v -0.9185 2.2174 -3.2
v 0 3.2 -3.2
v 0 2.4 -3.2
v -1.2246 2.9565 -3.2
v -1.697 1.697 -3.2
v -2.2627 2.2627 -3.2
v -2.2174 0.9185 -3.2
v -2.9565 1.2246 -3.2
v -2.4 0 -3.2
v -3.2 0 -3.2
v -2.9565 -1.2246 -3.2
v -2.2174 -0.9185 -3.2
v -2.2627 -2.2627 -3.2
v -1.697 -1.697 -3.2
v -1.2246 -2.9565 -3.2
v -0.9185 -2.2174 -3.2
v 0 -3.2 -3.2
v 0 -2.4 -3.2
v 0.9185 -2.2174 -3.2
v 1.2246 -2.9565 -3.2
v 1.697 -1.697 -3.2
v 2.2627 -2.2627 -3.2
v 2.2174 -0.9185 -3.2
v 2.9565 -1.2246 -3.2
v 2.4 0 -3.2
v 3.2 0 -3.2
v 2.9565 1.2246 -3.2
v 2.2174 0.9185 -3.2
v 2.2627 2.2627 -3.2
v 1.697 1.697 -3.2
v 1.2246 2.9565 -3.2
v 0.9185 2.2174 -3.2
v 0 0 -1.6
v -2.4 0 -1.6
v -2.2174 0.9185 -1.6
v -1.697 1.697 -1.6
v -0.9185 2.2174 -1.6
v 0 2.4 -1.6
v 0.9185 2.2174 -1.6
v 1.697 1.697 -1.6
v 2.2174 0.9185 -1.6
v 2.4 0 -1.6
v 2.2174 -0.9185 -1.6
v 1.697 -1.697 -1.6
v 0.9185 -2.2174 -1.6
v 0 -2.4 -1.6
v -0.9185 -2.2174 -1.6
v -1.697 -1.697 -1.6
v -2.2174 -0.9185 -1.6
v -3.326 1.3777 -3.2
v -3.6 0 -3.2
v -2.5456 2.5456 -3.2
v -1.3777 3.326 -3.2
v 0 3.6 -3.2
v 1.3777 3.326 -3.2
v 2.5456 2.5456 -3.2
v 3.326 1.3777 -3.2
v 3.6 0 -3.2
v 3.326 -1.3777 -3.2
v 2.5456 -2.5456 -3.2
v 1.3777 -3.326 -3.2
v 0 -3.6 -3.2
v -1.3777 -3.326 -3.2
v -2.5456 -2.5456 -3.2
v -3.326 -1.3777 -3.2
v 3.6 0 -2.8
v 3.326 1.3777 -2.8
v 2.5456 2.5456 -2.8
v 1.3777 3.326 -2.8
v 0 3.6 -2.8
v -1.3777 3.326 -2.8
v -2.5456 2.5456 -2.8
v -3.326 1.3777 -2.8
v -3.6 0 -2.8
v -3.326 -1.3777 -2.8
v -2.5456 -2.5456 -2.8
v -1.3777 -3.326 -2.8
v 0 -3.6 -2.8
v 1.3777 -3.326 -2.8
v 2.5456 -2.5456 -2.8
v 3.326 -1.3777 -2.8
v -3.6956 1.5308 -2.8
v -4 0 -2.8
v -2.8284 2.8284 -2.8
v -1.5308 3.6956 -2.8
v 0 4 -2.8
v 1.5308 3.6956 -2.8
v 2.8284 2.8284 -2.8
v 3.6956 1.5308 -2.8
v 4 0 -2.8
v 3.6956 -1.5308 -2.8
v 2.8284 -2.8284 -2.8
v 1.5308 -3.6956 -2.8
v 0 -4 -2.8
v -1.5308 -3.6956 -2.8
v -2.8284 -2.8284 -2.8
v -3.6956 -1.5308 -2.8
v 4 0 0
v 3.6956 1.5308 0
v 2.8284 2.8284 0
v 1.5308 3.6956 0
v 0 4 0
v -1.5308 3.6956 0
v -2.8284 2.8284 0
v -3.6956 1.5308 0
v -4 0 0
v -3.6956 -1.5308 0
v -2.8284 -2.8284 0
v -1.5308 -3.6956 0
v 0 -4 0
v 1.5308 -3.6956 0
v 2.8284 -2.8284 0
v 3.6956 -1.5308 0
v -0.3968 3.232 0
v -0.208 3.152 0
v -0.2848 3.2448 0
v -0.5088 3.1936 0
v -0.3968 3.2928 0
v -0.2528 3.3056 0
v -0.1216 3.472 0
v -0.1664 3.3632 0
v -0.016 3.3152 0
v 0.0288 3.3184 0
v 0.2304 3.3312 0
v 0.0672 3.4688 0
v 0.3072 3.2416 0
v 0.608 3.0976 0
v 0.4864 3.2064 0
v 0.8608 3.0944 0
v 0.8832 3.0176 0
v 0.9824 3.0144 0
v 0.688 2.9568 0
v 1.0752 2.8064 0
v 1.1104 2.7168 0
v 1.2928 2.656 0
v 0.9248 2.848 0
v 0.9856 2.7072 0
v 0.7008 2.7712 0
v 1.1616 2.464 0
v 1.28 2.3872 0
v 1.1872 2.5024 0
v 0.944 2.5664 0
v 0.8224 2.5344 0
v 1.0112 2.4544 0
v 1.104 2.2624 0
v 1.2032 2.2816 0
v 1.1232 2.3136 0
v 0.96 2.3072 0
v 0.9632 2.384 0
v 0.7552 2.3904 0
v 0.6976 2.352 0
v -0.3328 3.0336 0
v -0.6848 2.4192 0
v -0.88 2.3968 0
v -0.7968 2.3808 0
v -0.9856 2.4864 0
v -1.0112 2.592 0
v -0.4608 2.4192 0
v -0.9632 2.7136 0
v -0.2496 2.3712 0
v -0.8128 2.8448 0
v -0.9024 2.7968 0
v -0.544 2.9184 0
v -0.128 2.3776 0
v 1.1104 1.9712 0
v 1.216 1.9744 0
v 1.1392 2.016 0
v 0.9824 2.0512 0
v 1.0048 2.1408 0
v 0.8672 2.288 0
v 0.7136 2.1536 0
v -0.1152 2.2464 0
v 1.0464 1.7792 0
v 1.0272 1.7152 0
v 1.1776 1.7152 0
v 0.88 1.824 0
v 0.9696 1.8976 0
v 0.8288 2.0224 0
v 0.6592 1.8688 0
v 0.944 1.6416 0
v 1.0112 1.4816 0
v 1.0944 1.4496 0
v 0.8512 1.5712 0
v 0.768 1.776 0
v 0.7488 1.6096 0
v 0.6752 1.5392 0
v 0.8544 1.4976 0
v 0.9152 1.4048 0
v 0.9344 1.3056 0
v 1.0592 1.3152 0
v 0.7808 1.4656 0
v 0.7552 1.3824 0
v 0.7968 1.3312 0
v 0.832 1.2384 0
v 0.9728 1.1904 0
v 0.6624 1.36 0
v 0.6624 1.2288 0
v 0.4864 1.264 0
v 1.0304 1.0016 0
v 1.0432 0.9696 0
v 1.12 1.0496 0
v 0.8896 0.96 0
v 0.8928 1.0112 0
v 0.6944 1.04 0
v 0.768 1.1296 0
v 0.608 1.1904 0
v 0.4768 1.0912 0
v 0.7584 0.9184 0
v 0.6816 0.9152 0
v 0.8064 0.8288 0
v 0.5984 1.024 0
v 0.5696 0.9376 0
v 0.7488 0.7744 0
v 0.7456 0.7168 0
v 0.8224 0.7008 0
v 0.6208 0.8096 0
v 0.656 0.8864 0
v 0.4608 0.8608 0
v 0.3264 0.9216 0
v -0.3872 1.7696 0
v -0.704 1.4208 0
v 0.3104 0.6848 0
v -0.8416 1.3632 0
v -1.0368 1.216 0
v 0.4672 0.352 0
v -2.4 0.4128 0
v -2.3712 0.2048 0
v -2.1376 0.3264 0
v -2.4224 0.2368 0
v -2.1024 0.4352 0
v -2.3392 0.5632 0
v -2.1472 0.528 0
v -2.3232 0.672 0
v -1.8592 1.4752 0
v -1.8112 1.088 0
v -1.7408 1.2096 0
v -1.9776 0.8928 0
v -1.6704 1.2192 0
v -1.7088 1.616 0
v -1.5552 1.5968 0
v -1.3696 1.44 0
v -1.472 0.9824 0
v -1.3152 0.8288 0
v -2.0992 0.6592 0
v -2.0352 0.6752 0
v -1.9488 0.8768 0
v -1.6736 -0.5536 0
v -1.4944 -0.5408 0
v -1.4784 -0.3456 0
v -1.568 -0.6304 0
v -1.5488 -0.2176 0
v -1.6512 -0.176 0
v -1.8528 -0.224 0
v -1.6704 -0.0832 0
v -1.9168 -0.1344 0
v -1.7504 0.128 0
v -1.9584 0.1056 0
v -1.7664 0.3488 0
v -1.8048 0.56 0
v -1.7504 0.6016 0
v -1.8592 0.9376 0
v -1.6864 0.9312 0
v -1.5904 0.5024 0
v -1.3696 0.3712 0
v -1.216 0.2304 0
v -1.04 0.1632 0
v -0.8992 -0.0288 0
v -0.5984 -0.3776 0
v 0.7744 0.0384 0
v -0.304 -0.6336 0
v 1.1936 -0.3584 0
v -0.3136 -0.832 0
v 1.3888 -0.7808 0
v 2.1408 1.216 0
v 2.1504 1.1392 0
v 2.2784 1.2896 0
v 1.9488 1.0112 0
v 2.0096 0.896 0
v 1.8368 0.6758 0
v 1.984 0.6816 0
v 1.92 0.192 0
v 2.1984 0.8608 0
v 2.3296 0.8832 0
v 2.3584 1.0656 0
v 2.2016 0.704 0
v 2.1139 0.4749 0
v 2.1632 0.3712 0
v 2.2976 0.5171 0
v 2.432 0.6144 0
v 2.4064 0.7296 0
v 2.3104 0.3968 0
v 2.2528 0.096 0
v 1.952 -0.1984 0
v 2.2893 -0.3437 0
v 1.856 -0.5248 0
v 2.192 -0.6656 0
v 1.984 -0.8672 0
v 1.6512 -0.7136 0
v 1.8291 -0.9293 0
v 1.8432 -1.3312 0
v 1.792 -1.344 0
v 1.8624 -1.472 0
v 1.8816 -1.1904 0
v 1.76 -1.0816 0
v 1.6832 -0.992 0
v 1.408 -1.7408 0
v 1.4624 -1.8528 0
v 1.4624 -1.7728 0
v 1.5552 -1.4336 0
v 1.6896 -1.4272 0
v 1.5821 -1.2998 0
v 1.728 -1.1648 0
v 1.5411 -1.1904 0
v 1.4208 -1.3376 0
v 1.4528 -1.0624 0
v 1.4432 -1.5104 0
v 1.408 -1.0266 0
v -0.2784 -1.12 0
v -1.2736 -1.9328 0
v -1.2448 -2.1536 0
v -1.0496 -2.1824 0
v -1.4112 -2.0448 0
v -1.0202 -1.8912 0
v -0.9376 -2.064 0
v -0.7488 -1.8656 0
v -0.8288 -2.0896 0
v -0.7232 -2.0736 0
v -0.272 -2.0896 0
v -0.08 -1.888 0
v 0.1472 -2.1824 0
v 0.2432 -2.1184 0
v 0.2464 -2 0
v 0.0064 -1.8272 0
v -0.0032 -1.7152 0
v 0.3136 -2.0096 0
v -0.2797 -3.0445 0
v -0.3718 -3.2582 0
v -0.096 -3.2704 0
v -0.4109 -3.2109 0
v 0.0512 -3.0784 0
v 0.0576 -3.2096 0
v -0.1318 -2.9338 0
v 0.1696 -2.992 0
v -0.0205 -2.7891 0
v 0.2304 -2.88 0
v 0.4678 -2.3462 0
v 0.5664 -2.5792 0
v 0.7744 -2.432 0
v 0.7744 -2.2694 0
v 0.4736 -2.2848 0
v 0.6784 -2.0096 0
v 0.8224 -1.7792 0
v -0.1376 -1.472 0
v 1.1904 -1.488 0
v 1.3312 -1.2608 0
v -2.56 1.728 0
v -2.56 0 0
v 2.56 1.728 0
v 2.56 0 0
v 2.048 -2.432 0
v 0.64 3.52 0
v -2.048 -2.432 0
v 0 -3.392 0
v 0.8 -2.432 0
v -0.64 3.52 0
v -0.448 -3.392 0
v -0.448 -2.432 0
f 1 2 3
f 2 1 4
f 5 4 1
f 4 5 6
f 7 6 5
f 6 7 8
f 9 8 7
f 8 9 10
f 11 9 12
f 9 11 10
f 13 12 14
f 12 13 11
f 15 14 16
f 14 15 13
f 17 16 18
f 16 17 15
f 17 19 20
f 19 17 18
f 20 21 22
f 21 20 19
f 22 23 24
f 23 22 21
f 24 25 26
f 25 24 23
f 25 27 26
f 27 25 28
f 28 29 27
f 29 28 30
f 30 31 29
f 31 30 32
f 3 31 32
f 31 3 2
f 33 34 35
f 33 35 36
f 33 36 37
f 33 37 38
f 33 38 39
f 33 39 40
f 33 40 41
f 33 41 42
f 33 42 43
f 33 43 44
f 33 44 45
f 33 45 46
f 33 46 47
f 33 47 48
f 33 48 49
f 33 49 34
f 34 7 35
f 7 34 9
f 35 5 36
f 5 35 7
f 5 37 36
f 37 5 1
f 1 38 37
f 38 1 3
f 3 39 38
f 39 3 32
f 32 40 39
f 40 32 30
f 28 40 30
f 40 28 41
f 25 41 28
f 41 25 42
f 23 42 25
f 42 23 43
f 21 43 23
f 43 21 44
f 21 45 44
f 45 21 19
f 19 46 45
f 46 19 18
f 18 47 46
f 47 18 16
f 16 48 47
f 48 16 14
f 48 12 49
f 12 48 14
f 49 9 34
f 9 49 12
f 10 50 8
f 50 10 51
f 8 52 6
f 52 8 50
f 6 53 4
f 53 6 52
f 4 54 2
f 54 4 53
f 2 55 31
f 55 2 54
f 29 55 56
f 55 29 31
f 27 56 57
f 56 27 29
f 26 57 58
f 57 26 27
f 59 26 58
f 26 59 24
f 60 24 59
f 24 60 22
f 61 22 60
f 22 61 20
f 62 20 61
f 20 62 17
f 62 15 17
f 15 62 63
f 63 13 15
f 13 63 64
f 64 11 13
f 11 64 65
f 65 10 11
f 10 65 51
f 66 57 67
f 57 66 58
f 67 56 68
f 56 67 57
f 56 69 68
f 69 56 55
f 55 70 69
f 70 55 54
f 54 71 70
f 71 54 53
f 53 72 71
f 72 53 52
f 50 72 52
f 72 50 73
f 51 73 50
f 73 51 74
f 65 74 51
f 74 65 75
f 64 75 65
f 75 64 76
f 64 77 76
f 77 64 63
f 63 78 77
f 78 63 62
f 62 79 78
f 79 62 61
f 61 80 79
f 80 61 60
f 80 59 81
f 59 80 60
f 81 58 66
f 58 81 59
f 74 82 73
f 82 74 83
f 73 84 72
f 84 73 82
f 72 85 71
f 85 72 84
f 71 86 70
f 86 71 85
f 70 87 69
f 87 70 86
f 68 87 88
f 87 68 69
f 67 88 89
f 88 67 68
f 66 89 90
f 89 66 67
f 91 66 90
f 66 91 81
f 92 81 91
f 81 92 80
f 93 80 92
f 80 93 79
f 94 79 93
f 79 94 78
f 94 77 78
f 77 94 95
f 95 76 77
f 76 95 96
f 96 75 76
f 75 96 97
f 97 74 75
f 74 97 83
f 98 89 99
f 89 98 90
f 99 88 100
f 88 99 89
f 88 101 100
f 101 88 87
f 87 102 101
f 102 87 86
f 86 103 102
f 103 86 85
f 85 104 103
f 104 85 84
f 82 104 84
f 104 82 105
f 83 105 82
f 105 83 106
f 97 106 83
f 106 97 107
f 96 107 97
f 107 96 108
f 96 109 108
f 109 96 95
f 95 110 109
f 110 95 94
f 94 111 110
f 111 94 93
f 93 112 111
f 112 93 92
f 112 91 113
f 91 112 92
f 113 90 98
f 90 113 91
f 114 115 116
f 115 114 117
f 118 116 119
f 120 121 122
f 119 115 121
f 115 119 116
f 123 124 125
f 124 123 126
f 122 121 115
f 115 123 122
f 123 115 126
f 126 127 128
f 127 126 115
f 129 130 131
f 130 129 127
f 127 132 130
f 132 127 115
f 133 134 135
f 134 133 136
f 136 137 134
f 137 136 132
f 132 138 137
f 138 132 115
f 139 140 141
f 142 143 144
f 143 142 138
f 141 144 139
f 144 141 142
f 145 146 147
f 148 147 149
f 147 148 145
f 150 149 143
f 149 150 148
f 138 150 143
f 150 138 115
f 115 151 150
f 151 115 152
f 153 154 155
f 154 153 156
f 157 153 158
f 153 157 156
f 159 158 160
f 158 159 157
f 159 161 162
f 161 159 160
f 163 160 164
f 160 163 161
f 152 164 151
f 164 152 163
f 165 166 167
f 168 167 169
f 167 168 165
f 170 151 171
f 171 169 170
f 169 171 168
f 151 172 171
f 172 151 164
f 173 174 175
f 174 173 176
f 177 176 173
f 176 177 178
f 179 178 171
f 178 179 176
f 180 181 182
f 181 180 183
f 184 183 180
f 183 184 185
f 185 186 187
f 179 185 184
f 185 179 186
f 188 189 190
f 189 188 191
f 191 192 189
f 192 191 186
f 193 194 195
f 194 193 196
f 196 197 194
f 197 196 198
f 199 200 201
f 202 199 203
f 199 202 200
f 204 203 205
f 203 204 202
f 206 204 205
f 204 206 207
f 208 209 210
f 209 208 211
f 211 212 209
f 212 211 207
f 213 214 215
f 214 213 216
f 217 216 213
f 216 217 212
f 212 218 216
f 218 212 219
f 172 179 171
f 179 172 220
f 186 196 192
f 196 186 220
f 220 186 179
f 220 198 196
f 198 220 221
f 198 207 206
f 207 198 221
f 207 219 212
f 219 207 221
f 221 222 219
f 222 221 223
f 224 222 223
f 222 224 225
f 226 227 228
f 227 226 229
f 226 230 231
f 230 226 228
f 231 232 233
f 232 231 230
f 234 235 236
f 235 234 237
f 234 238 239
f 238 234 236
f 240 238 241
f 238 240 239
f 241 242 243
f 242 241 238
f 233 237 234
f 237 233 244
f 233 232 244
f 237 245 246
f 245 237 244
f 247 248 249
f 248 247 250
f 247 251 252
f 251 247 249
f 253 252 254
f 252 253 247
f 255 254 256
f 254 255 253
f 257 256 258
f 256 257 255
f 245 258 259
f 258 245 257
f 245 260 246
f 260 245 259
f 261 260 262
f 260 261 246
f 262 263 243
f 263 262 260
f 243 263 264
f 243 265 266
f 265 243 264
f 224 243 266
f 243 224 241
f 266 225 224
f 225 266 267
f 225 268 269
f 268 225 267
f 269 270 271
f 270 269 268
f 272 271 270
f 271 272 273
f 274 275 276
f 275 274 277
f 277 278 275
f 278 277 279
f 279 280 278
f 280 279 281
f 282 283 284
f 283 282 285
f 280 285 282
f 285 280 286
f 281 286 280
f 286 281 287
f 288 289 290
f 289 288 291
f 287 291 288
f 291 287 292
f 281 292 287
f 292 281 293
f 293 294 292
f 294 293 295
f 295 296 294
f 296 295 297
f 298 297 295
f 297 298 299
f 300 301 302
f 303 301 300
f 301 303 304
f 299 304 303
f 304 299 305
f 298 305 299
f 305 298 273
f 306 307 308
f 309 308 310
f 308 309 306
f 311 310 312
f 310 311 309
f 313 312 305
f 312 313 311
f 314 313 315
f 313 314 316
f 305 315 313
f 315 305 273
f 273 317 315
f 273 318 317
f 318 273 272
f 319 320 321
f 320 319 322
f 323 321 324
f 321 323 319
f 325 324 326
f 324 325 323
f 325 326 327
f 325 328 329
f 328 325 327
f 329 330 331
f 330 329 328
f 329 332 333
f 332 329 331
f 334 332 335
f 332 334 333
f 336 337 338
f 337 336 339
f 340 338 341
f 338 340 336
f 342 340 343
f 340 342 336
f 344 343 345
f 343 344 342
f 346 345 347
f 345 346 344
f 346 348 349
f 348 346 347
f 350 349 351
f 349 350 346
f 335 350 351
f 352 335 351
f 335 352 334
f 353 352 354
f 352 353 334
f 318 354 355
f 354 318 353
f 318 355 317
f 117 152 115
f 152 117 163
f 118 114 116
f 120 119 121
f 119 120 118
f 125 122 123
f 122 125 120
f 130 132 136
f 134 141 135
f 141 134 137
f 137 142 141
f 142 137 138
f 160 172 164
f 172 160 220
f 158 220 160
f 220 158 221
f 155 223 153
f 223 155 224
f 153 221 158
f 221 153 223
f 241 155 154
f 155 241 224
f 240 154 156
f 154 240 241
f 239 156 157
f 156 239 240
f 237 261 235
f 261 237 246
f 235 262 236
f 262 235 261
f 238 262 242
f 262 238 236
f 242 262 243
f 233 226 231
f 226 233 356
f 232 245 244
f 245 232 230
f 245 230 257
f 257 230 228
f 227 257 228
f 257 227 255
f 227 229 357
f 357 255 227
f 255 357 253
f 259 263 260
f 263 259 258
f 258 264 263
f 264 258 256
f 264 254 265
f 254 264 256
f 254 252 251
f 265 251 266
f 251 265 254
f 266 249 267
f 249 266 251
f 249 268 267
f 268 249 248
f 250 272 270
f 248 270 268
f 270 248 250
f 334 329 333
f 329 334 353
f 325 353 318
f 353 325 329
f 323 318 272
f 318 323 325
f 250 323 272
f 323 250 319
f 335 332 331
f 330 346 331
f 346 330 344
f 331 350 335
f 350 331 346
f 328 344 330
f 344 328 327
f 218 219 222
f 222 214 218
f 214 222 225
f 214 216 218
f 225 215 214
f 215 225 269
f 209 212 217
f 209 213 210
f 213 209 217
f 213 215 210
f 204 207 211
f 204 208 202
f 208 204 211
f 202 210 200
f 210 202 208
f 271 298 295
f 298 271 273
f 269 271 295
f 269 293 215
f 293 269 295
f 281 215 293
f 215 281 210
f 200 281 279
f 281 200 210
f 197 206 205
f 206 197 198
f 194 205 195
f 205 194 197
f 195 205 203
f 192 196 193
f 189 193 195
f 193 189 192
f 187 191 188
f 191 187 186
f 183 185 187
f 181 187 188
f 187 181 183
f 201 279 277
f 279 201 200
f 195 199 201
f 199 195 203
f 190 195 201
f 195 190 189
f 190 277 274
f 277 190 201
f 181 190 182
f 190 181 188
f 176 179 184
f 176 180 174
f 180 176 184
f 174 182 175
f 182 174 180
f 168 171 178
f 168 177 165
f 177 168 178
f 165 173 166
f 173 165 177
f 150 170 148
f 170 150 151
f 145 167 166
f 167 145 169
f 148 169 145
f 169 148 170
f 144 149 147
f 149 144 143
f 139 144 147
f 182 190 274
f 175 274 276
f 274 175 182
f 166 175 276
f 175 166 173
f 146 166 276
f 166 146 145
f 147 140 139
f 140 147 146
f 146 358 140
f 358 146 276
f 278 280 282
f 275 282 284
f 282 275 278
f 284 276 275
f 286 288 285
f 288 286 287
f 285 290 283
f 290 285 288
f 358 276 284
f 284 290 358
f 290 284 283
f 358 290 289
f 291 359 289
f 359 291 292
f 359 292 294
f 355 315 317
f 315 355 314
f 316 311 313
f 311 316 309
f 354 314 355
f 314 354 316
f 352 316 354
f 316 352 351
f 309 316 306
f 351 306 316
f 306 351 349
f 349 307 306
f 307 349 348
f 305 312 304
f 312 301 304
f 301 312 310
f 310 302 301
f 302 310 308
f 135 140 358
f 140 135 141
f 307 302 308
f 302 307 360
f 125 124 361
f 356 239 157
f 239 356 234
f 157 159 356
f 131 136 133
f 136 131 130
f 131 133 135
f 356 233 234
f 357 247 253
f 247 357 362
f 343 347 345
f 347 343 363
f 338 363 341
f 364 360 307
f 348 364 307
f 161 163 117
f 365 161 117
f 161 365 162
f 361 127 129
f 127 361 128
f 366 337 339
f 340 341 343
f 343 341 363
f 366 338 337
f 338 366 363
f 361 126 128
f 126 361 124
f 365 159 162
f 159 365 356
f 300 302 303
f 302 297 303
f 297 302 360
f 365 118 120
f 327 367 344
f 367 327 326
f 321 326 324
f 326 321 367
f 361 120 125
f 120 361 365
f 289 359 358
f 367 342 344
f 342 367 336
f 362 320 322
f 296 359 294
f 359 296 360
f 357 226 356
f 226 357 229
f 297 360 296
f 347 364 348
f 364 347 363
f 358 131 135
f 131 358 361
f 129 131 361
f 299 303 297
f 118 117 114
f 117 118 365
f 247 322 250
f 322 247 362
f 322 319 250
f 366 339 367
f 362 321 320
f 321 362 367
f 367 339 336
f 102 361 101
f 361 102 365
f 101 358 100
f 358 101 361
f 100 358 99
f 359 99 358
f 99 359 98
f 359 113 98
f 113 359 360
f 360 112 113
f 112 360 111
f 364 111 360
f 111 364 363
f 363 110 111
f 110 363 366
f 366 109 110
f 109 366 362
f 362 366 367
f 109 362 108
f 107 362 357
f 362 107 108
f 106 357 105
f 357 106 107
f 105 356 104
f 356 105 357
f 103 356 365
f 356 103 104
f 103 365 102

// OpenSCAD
use <../lib.scad>
use <../p/4-4ering.scad>
use <../p/logo-ferrari-horse-simplified-irregular-box.scad>
use <../p/logo-ferrari-horse-simplified.scad>
use <s/98138s02.scad>
function ldraw_lib__98138pt4() = [
// 0 Tile  1 x  1 Round with Black Ferrari Horse Logo Pattern
// 0 Name: 98138pt4.dat
// 0 Author: Jens Brühl [jb70]
// 0 !LDRAW_ORG Part UPDATE 2025-08
// 0 !LICENSE Licensed under CC BY 4.0 : see CAreadme.txt
// 
// 0 BFC CERTIFY CCW
  [0,"BFC","CERTIFY"],
  [0,"BFC","CCW"],
// 
// 0 !KEYWORDS Bricklink 98138pb319, Daytona, Ferrari, Rebrickable 98138pr0323
// 0 !KEYWORDS set 42143
// 
// 0 !HISTORY 2025-05-28 [OrionP] Official Update 2025-05
// 0 !HISTORY 2025-07-09 [Holly-Wood] Updated to new prim
// 0 !HISTORY 2025-08-31 [OrionP] Official Update 2025-08
// 
// 1 16 0 0 0 1 0 0 0 1 0 0 0 1 s\98138s02.dat
  [1,16,0,0,0,1,0,0,0,1,0,0,0,1, ldraw_lib__s__98138s02()],
// 1 16 0 0 0 10 0 0 0 1 0 0 0 10 4-4ering.dat
  [1,16,0,0,0,10,0,0,0,1,0,0,0,10, ldraw_lib__4_4ering()],
// 
// 1 0 0 0 0 1.6 0 0 0 1 0 0 0 1.6 logo-ferrari-horse-simplified.dat
  [1,0,0,0,0,1.6,0,0,0,1,0,0,0,1.6, ldraw_lib__logo_ferrari_horse_simplified()],
// 1 16 0 0 0 1.6 0 0 0 1 0 0 0 1.6 logo-ferrari-horse-simplified-irregular-box.dat
  [1,16,0,0,0,1.6,0,0,0,1,0,0,0,1.6, ldraw_lib__logo_ferrari_horse_simplified_irregular_box()],
// 
// 4 16 3.827 0 9.239 0 0 10 -1.6 0 8.8 1.6 0 8.8
  [4,16,3.827,0,9.239,0,0,10,-1.6,0,8.8,1.6,0,8.8],
// 4 16 1.6 0 8.8 6.4 0 4.32 7.071 0 7.071 3.827 0 9.239
  [4,16,1.6,0,8.8,6.4,0,4.32,7.071,0,7.071,3.827,0,9.239],
// 3 16 7.071 0 7.071 6.4 0 4.32 9.239 0 3.827
  [3,16,7.071,0,7.071,6.4,0,4.32,9.239,0,3.827],
// 4 16 6.4 0 4.32 6.4 0 0 10 0 0 9.239 0 3.827
  [4,16,6.4,0,4.32,6.4,0,0,10,0,0,9.239,0,3.827],
// 4 16 5.12 0 -6.08 9.239 0 -3.827 10 0 0 6.4 0 0
  [4,16,5.12,0,-6.08,9.239,0,-3.827,10,0,0,6.4,0,0],
// 4 16 3.827 0 -9.239 7.071 0 -7.071 9.239 0 -3.827 5.12 0 -6.08
  [4,16,3.827,0,-9.239,7.071,0,-7.071,9.239,0,-3.827,5.12,0,-6.08],
// 4 16 0 0 -8.48 3.827 0 -9.239 5.12 0 -6.08 2 0 -6.08
  [4,16,0,0,-8.48,3.827,0,-9.239,5.12,0,-6.08,2,0,-6.08],
// 4 16 -1.12 0 -8.48 0 0 -10 3.827 0 -9.239 0 0 -8.48
  [4,16,-1.12,0,-8.48,0,0,-10,3.827,0,-9.239,0,0,-8.48],
// 4 16 -5.12 0 -6.08 -3.827 0 -9.239 0 0 -10 -1.12 0 -8.48
  [4,16,-5.12,0,-6.08,-3.827,0,-9.239,0,0,-10,-1.12,0,-8.48],
// 3 16 -5.12 0 -6.08 -1.12 0 -8.48 -1.12 0 -6.08
  [3,16,-5.12,0,-6.08,-1.12,0,-8.48,-1.12,0,-6.08],
// 3 16 -3.827 0 -9.239 -5.12 0 -6.08 -7.071 0 -7.071
  [3,16,-3.827,0,-9.239,-5.12,0,-6.08,-7.071,0,-7.071],
// 4 16 -6.4 0 0 -9.239 0 -3.827 -7.071 0 -7.071 -5.12 0 -6.08
  [4,16,-6.4,0,0,-9.239,0,-3.827,-7.071,0,-7.071,-5.12,0,-6.08],
// 4 16 -9.239 0 3.827 -10 0 0 -9.239 0 -3.827 -6.4 0 0
  [4,16,-9.239,0,3.827,-10,0,0,-9.239,0,-3.827,-6.4,0,0],
// 4 16 -7.071 0 7.071 -9.239 0 3.827 -6.4 0 0 -6.4 0 4.32
  [4,16,-7.071,0,7.071,-9.239,0,3.827,-6.4,0,0,-6.4,0,4.32],
// 4 16 -6.4 0 4.32 -1.6 0 8.8 -3.827 0 9.239 -7.071 0 7.071
  [4,16,-6.4,0,4.32,-1.6,0,8.8,-3.827,0,9.239,-7.071,0,7.071],
// 3 16 -3.827 0 9.239 -1.6 0 8.8 0 0 10
  [3,16,-3.827,0,9.239,-1.6,0,8.8,0,0,10],
];
module ldraw_lib__98138pt4(step=0, col=false, unit=2/5, alt=false, line=0.2, solid=!$preview)
    makepoly(ldraw_lib__98138pt4(), step=step, col=col, unit=unit, alt=alt, line=line, solid=solid);
ldraw_lib__98138pt4(line=0.2);
